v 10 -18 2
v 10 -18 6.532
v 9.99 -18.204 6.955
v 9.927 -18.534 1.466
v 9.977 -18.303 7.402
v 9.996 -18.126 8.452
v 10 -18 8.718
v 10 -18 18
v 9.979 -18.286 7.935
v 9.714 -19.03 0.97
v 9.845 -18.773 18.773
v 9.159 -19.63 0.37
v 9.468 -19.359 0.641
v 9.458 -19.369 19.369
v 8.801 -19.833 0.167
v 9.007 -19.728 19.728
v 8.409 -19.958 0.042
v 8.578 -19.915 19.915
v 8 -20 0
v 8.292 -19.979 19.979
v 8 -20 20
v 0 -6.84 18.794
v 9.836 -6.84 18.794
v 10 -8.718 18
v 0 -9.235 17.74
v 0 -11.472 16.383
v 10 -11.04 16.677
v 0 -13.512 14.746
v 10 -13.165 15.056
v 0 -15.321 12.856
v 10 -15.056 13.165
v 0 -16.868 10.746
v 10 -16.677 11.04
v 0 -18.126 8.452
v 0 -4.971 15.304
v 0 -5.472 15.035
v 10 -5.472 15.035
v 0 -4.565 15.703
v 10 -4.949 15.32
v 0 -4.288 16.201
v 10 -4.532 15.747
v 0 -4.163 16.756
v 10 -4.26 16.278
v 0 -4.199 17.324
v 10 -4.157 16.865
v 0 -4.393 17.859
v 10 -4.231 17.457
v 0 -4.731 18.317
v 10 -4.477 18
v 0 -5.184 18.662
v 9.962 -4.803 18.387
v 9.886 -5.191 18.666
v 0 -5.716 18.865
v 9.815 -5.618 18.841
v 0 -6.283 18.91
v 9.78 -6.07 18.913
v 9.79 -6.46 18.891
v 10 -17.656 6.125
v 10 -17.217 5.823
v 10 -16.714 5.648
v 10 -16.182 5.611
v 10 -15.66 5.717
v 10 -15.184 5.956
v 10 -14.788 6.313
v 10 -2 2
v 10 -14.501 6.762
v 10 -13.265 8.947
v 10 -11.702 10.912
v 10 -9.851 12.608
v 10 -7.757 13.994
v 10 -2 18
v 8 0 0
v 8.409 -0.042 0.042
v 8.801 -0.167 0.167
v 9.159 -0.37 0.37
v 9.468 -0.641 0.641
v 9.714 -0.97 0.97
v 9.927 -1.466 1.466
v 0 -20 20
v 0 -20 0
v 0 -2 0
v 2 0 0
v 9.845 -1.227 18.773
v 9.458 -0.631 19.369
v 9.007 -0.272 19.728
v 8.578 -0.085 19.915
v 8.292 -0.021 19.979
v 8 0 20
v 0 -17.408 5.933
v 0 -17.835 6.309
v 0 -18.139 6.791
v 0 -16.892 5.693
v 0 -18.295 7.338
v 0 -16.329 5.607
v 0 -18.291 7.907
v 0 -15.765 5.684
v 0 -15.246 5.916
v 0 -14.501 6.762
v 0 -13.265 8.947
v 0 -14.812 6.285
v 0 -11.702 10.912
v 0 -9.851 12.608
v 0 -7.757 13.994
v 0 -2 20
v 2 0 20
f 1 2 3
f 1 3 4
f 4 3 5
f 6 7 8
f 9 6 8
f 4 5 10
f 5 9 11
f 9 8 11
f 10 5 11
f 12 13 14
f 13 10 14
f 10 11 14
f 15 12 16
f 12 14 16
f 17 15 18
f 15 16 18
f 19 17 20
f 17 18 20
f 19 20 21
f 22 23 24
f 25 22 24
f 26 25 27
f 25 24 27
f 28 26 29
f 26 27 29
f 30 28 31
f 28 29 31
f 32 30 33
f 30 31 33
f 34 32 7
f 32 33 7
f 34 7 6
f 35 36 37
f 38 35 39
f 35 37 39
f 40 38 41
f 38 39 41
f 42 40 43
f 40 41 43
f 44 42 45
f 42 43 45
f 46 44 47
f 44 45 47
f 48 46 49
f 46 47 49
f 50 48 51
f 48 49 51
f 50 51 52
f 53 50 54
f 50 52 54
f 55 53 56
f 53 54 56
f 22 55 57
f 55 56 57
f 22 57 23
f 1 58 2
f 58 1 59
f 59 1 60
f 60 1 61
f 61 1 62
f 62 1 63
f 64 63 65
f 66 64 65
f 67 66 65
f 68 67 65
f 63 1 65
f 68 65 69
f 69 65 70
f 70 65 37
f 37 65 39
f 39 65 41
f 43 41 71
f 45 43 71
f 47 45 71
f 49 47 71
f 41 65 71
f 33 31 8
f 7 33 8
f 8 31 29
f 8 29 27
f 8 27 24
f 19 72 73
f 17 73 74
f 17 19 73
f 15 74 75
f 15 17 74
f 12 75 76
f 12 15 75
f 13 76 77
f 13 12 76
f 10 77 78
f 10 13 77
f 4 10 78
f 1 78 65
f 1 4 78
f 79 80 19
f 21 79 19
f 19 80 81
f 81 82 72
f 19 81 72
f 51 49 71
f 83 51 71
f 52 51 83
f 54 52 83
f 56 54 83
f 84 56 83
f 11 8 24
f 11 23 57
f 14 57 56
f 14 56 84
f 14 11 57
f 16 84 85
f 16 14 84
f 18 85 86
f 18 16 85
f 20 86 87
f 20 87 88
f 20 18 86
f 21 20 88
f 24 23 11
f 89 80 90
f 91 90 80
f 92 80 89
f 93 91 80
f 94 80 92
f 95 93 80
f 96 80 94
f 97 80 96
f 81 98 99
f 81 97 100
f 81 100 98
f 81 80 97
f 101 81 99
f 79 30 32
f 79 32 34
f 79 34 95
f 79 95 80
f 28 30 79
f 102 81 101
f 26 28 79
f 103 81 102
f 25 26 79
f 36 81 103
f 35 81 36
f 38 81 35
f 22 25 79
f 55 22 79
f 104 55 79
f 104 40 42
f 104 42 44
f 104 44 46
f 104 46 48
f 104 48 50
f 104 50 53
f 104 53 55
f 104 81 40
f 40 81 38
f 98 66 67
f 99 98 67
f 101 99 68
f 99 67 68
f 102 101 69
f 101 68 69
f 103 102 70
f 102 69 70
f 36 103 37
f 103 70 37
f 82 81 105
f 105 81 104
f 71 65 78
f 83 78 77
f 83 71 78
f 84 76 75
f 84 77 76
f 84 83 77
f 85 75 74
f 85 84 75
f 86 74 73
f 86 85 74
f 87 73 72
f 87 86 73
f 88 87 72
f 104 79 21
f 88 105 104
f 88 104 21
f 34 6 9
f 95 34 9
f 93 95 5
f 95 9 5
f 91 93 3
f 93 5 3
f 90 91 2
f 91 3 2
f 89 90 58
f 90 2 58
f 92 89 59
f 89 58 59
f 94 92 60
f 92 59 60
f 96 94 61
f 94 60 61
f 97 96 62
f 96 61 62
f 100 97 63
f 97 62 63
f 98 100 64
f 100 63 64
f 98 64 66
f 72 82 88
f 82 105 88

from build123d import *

# Parameters (mm, degrees)
F0_W     = 10
F0_H     = 20
F1_DEPTH = 20
F2_R     = 2
F3_SIZE  = 2
F5_DEPTH = 24.4


with BuildPart() as f1:
    # F0 (on Front) → F1 (new body)
    with BuildSketch(Plane.XZ):
        with Locations((5, 10)):
            Rectangle(F0_W, F0_H)
    extrude(amount=F1_DEPTH)

    # F2
    f2_edges = [f1.edges().sort_by_distance(p)[0] for p in [
        (10, -10, 0),
        (10, -10, 20),
        (10, 0, 10),
        (10, -20, 10),
    ]]
    fillet(f2_edges, radius=F2_R)

    # F3
    f3_edges = [f1.edges().sort_by_distance(p)[0] for p in [
        (0, 0, 10),
    ]]
    chamfer(f3_edges, length=F3_SIZE)

    # F4 (on face) → F5 (cut)
    with BuildSketch(Plane.YZ.offset(10)):
        with BuildLine():
            ThreePointArc((-5.472322, 15.035082), (-4.276977, 17.598507), (-6.840403, 18.793852))
            ThreePointArc((-6.840403, 18.793852), (-13.511804, 14.745547), (-18.126156, 8.452365))
            ThreePointArc((-18.126156, 8.452365), (-17.158777, 5.794513), (-14.500925, 6.761892))
            ThreePointArc((-14.500925, 6.761892), (-10.809443, 11.796437), (-5.472322, 15.035082))
        make_face()
    extrude(amount=-F5_DEPTH, mode=Mode.SUBTRACT)


solid = f1.part
